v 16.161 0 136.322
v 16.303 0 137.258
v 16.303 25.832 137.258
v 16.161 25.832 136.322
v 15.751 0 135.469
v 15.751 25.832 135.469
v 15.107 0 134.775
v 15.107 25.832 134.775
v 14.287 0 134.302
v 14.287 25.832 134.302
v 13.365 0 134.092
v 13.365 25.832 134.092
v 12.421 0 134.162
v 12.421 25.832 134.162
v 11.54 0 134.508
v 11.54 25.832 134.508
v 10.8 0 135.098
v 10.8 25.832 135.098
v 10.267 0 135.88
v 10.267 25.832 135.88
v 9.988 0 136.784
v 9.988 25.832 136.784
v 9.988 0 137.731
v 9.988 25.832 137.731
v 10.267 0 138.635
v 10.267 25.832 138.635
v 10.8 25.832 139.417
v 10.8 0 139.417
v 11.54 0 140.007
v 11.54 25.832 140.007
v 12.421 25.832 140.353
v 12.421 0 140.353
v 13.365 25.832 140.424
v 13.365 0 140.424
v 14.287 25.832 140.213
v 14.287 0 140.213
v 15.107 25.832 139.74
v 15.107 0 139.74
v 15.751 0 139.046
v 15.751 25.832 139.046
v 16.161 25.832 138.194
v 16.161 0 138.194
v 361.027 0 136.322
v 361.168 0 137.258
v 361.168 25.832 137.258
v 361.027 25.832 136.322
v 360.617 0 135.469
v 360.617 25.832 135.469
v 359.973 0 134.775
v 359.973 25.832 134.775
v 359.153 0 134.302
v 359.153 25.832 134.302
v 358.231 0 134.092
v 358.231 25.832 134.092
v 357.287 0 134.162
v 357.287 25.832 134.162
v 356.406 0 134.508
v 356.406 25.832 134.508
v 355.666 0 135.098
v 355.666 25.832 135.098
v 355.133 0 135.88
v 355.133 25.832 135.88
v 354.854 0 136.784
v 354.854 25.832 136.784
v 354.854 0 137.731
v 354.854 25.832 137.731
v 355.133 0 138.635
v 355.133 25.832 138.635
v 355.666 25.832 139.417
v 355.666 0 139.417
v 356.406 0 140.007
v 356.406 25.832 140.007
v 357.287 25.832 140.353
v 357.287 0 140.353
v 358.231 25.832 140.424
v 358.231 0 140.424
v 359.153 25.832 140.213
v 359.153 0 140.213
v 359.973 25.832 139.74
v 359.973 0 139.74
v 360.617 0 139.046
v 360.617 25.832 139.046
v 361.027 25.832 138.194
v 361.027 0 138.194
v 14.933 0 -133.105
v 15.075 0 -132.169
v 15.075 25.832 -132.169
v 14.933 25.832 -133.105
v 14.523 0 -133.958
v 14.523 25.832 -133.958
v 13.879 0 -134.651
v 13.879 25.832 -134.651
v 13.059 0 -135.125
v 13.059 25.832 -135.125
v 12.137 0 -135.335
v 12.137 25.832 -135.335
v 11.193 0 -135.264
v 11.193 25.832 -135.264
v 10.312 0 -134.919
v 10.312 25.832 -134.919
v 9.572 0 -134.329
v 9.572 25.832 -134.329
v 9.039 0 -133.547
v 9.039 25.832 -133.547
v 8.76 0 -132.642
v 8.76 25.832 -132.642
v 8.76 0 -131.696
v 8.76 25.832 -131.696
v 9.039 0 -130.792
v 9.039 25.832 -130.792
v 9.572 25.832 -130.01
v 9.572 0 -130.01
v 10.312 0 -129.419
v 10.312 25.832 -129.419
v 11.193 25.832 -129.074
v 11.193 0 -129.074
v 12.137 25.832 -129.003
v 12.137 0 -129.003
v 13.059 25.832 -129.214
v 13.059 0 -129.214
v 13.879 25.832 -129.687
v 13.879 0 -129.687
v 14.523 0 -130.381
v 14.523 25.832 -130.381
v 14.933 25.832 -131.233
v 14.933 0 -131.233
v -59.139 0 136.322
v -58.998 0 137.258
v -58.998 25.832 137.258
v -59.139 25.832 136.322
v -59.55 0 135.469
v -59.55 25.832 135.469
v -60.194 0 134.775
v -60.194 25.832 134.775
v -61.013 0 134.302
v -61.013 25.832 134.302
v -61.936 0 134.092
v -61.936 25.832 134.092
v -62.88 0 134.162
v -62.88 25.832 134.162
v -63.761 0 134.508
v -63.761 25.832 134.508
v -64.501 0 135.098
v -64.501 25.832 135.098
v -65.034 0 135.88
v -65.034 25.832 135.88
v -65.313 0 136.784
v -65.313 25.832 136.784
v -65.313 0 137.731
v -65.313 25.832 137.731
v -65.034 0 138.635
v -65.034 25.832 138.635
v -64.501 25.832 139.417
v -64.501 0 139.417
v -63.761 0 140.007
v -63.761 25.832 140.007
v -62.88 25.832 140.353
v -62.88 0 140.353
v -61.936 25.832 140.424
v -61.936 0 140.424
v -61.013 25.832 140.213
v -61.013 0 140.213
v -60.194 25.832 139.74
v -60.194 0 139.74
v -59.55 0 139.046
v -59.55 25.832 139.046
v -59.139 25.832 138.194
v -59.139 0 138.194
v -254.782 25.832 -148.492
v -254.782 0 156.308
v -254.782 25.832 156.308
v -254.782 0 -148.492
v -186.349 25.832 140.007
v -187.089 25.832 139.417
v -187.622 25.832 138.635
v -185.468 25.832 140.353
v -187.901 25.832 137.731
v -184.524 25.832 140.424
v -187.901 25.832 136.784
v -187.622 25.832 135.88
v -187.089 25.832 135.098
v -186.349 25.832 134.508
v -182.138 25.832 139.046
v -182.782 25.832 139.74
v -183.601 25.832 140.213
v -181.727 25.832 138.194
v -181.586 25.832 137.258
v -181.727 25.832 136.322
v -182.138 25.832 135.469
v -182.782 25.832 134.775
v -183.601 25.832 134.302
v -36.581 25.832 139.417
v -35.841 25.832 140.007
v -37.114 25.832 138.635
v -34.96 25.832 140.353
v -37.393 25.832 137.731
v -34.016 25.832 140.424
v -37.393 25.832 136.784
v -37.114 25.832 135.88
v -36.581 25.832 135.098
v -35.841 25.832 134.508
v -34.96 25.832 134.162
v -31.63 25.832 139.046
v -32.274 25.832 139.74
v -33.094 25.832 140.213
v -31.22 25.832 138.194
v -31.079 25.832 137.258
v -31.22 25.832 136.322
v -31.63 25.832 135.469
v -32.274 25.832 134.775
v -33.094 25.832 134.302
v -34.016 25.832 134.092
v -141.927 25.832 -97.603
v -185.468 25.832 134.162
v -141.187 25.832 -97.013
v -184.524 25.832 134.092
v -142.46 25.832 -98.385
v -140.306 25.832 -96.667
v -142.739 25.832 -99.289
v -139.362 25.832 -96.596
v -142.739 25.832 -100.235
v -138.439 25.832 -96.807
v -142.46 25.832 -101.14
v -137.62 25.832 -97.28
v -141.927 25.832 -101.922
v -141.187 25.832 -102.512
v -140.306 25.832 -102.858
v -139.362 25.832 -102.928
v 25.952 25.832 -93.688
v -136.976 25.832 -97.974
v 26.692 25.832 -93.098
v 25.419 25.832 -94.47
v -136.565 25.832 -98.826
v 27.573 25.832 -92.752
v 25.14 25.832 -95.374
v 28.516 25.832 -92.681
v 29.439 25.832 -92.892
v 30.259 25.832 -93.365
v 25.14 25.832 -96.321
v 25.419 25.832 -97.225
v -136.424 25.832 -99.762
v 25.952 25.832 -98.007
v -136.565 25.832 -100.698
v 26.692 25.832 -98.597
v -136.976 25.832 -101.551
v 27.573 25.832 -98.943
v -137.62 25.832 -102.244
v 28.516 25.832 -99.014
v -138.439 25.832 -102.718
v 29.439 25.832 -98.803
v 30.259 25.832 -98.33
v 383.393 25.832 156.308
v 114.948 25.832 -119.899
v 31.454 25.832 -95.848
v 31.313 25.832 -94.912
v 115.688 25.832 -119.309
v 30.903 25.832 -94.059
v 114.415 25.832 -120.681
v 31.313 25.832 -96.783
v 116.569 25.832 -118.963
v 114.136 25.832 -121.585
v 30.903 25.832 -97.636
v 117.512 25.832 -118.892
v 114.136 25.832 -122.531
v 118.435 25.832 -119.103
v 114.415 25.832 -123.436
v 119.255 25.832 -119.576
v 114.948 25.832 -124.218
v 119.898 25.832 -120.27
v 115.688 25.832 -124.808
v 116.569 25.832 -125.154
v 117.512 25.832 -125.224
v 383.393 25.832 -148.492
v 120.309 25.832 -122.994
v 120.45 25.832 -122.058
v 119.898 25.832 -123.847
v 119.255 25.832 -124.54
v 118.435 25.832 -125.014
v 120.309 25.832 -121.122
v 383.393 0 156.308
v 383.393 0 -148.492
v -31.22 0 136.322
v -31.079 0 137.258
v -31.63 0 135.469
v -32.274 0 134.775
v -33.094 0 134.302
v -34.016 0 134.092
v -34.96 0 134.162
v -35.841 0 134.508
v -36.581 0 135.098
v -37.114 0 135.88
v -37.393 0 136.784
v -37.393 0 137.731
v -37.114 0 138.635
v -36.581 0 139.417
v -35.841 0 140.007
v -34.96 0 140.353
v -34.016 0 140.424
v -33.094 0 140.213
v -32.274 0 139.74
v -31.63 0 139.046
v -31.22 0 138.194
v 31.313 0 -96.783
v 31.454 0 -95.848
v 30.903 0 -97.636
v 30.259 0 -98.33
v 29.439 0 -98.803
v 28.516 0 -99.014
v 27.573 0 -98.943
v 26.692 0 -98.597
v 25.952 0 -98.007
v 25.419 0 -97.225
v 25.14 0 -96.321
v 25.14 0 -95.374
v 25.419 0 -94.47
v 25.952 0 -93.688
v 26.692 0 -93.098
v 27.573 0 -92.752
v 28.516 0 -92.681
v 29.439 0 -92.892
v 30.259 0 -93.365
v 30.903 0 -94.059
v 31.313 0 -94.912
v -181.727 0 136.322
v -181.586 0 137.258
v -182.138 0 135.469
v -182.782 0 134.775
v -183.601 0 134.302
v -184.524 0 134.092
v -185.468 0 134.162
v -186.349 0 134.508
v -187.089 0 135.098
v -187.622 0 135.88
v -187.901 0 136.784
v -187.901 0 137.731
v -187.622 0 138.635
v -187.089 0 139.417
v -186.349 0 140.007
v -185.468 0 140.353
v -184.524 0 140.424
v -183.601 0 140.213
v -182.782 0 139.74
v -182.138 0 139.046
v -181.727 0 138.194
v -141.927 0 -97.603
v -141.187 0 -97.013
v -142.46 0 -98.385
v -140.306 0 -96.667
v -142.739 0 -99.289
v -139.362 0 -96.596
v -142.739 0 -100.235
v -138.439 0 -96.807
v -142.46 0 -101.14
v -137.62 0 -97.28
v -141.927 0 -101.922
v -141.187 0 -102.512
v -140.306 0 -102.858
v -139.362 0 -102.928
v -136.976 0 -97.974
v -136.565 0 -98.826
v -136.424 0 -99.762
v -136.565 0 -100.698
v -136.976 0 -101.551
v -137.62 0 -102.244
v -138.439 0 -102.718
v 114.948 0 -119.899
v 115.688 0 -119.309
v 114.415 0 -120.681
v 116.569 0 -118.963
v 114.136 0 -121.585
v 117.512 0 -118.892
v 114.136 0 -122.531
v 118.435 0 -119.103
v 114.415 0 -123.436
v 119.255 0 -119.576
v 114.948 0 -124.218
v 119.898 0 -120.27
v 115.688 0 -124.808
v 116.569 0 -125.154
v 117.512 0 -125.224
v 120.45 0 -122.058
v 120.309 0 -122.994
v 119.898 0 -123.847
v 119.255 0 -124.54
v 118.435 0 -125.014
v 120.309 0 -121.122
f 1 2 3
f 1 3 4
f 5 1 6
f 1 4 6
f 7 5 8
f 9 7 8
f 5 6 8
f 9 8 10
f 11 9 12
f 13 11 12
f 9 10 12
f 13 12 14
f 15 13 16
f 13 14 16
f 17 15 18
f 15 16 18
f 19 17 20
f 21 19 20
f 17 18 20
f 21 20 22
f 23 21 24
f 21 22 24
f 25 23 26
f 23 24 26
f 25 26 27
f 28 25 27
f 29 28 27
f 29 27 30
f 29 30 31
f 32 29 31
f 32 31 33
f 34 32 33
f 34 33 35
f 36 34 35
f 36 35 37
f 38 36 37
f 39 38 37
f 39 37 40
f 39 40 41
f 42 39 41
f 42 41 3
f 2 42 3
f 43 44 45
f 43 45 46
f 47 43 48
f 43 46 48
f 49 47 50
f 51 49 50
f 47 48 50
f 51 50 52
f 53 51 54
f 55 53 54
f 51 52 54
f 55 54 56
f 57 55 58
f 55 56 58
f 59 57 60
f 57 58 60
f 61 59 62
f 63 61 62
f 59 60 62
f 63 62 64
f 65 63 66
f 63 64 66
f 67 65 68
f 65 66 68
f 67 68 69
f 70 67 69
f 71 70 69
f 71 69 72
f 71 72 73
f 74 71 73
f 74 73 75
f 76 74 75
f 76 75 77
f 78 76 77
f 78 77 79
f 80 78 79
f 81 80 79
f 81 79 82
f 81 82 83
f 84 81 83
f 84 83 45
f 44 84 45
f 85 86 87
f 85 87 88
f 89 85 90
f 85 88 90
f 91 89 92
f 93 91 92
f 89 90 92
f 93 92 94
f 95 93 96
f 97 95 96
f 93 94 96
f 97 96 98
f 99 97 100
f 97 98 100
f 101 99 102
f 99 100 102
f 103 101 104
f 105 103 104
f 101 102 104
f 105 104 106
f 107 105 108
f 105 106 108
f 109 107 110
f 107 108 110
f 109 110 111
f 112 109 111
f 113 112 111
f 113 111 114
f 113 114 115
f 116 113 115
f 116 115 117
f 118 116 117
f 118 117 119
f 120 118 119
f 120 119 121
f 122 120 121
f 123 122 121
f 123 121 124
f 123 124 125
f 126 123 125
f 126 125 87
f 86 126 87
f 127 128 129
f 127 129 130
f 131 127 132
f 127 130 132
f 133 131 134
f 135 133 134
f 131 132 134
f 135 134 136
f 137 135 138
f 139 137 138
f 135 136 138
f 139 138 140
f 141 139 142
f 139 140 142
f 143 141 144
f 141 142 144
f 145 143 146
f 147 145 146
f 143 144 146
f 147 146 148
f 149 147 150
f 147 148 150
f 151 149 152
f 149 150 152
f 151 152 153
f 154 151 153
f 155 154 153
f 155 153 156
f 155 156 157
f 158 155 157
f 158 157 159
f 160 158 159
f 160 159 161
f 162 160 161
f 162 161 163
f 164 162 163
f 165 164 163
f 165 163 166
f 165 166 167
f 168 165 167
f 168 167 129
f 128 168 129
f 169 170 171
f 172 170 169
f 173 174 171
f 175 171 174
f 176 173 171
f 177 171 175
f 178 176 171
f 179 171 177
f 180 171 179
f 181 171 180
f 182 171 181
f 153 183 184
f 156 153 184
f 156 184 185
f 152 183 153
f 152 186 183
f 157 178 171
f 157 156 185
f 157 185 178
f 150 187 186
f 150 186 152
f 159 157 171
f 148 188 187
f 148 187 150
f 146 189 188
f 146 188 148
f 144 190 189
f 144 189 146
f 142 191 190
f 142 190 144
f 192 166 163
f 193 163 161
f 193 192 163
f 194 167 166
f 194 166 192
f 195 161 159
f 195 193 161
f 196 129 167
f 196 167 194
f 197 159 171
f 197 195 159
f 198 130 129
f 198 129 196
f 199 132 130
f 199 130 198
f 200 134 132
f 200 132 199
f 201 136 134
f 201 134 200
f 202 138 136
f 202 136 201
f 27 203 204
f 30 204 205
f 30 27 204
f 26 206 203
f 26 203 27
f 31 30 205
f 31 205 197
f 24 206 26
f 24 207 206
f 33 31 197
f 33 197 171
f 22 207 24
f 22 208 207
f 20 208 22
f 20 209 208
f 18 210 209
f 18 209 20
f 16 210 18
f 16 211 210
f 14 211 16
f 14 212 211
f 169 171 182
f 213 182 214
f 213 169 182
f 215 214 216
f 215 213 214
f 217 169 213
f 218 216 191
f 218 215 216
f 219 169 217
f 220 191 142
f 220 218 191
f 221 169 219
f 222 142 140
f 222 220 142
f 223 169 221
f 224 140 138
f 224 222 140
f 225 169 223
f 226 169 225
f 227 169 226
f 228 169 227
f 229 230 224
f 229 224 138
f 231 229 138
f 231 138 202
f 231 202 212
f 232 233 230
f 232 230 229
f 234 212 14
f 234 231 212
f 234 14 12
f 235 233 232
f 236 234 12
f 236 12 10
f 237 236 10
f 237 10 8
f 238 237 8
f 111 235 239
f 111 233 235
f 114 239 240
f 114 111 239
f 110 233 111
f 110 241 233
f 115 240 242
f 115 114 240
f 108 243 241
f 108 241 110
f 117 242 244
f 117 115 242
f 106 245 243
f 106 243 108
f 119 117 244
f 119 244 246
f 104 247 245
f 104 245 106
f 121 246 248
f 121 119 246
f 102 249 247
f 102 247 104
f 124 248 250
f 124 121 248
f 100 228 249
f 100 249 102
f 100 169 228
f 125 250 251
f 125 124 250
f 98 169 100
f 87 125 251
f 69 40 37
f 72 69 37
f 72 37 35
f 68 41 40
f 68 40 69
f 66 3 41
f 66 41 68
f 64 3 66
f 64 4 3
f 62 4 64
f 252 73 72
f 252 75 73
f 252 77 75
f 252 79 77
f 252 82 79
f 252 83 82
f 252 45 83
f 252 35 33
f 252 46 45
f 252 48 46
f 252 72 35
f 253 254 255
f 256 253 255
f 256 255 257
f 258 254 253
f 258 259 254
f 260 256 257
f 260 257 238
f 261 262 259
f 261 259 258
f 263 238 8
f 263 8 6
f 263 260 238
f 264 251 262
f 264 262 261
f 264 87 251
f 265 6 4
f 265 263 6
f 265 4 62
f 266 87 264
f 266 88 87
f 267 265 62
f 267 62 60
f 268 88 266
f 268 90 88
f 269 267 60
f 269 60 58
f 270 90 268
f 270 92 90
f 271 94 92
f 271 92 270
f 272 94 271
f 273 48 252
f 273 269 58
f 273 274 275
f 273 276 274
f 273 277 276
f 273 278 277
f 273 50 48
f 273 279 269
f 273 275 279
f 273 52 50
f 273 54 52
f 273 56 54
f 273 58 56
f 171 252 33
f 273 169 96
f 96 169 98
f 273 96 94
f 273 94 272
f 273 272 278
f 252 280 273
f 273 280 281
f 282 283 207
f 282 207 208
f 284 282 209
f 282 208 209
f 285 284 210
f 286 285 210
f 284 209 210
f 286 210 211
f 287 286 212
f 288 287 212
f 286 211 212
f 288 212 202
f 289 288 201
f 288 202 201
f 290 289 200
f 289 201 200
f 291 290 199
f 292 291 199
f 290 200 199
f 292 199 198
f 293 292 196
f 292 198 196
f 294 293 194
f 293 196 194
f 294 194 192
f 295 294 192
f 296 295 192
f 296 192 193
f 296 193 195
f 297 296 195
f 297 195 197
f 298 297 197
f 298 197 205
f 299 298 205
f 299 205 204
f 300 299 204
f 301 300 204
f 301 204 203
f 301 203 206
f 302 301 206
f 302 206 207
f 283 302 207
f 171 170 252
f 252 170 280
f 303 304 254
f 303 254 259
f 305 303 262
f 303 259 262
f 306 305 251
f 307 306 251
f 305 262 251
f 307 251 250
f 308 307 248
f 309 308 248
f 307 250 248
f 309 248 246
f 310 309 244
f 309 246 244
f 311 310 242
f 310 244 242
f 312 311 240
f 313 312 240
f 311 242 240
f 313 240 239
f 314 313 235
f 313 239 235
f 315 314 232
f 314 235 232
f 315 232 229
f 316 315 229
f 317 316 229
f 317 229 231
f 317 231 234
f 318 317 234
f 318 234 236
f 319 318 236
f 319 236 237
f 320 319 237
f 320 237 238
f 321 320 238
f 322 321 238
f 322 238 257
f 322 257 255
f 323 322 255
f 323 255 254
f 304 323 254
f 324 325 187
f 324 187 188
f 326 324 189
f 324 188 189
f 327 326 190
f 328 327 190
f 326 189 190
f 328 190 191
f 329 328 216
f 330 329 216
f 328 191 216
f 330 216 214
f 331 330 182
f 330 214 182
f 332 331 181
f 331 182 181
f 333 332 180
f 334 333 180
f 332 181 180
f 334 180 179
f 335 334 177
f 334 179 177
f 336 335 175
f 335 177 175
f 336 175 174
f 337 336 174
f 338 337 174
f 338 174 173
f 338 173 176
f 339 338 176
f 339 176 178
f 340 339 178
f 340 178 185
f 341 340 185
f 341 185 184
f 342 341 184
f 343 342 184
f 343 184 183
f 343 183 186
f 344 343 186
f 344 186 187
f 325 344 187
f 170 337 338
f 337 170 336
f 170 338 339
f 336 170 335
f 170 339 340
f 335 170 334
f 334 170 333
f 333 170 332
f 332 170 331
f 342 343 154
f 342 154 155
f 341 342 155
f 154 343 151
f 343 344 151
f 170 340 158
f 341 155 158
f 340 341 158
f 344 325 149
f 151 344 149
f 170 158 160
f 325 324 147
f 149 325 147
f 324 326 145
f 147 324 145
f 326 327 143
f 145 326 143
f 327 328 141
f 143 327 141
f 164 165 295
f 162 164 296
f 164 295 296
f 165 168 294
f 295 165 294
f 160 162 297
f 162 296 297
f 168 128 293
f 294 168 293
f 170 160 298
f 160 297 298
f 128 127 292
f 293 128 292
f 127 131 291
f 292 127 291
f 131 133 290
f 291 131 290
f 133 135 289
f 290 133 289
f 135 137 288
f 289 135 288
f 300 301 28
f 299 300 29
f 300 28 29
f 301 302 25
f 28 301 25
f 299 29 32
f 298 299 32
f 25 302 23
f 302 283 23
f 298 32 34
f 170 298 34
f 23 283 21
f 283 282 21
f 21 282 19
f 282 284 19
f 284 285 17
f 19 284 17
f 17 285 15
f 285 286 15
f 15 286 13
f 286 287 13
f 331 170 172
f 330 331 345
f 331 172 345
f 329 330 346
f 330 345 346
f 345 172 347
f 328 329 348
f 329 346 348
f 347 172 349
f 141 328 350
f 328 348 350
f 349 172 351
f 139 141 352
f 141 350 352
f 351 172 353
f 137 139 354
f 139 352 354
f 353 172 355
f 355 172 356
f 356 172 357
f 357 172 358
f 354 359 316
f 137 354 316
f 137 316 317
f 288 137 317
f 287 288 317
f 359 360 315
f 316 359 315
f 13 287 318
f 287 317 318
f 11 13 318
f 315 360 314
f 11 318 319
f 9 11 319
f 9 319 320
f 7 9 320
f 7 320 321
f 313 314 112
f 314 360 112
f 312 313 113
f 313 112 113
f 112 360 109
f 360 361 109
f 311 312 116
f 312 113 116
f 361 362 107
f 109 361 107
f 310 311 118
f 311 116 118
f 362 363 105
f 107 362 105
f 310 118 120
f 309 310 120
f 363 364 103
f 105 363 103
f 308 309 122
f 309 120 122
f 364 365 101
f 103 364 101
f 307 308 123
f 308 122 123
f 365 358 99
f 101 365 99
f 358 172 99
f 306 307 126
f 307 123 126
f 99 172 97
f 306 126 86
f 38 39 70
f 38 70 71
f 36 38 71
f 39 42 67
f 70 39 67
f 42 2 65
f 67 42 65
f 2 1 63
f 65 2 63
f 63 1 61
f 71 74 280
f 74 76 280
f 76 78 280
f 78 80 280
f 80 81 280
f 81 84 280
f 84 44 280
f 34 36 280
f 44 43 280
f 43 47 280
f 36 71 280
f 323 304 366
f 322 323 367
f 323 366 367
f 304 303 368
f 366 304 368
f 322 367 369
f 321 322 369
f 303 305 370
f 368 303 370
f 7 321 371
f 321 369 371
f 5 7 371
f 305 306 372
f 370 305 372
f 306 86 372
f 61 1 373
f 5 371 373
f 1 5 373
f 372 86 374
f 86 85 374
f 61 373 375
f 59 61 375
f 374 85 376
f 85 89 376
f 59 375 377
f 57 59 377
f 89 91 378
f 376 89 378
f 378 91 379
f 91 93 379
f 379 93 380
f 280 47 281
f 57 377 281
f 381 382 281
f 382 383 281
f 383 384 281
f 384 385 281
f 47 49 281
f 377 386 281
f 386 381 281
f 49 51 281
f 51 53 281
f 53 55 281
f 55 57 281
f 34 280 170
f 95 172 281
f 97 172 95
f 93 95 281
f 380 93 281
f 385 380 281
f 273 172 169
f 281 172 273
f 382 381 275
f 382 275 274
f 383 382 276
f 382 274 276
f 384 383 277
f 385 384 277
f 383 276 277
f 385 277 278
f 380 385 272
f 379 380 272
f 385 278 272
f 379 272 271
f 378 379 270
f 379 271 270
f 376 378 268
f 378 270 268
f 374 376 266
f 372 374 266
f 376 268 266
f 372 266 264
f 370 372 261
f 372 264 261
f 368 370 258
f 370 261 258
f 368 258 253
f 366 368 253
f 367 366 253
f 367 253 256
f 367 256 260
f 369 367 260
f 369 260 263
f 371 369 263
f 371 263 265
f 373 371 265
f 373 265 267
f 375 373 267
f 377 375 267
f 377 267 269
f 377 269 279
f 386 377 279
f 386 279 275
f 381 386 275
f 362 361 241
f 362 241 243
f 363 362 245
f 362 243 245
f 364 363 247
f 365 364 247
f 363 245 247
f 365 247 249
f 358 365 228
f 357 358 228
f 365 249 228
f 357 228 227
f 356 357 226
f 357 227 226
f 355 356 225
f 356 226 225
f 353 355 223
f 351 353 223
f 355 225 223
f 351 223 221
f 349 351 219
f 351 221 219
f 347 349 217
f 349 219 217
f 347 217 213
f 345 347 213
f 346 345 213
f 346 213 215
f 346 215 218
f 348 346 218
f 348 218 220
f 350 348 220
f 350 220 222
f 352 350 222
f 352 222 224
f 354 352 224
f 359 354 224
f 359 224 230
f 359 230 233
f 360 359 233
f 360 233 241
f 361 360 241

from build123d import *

# Parameters (mm, degrees)
SKETCH1_W                   = 638.175
SKETCH1_H                   = 304.8
JIG_STOCK_DEPTH             = 25.8318
SKETCH3_R                   = 3.175
FRONT_BOTTOM_WISHBONE_DEPTH = 26.8318
SKETCH5_R                   = 3.175
FRONT_TOP_WISHBONE_DEPTH    = 26.8318
SKETCH6_R                   = 3.175
REAR_TOP_WISHBONE_DEPTH     = 26.8318
SKETCH7_R                   = 3.175
REAR_BOTTOM_WISHBONE_DEPTH  = 26.8318


with BuildPart() as part:
    # Sketch1 → Jig stock (new body)
    with BuildSketch(Plane(origin=(0, 0, 0), x_dir=(1, 0, 0), z_dir=(0, 1, 0))):
        with Locations((64.305961538, -3.907692308)):
            Rectangle(SKETCH1_W, SKETCH1_H)
    extrude(amount=JIG_STOCK_DEPTH)

    # Sketch3 → Front bottom wishbone (cut, through all)
    with BuildSketch(Plane(origin=(0, 25.8318, 0), x_dir=(1, 0, 0), z_dir=(0, 1, 0))):
        with Locations((357.993461538, -137.257692308)):
            Circle(SKETCH3_R)
        with Locations((-62.173338462, -137.257692308)):
            Circle(SKETCH3_R)
        with Locations((11.899509072, 132.16909874)):
            Circle(SKETCH3_R)
    extrude(amount=-FRONT_BOTTOM_WISHBONE_DEPTH, mode=Mode.SUBTRACT)

    # Sketch5 → Front top wishbone (cut, through all)
    with BuildSketch(Plane(origin=(0, 25.8318, 0), x_dir=(1, 0, 0), z_dir=(0, 1, 0))):
        with Locations((13.127501538, -137.257692308)):
            Circle(SKETCH5_R)
        with Locations((117.27518671, 122.058176562)):
            Circle(SKETCH5_R)
    extrude(amount=-FRONT_TOP_WISHBONE_DEPTH, mode=Mode.SUBTRACT)

    # Sketch6 → Rear top wishbone (cut, through all)
    with BuildSketch(Plane(origin=(0, 25.8318, 0), x_dir=(1, 0, 0), z_dir=(0, 1, 0))):
        with Locations((-34.253658462, -137.257692308)):
            Circle(SKETCH6_R)
        with Locations((28.279213606, 95.847599015)):
            Circle(SKETCH6_R)
    extrude(amount=-REAR_TOP_WISHBONE_DEPTH, mode=Mode.SUBTRACT)

    # Sketch7 → Rear bottom wishbone (cut, through all)
    with BuildSketch(Plane(origin=(0, 25.8318, 0), x_dir=(1, 0, 0), z_dir=(0, 1, 0))):
        with Locations((-184.761358462, -137.257692308)):
            Circle(SKETCH7_R)
        with Locations((-139.599326464, 99.762159573)):
            Circle(SKETCH7_R)
    extrude(amount=-REAR_BOTTOM_WISHBONE_DEPTH, mode=Mode.SUBTRACT)


solid = part.part
